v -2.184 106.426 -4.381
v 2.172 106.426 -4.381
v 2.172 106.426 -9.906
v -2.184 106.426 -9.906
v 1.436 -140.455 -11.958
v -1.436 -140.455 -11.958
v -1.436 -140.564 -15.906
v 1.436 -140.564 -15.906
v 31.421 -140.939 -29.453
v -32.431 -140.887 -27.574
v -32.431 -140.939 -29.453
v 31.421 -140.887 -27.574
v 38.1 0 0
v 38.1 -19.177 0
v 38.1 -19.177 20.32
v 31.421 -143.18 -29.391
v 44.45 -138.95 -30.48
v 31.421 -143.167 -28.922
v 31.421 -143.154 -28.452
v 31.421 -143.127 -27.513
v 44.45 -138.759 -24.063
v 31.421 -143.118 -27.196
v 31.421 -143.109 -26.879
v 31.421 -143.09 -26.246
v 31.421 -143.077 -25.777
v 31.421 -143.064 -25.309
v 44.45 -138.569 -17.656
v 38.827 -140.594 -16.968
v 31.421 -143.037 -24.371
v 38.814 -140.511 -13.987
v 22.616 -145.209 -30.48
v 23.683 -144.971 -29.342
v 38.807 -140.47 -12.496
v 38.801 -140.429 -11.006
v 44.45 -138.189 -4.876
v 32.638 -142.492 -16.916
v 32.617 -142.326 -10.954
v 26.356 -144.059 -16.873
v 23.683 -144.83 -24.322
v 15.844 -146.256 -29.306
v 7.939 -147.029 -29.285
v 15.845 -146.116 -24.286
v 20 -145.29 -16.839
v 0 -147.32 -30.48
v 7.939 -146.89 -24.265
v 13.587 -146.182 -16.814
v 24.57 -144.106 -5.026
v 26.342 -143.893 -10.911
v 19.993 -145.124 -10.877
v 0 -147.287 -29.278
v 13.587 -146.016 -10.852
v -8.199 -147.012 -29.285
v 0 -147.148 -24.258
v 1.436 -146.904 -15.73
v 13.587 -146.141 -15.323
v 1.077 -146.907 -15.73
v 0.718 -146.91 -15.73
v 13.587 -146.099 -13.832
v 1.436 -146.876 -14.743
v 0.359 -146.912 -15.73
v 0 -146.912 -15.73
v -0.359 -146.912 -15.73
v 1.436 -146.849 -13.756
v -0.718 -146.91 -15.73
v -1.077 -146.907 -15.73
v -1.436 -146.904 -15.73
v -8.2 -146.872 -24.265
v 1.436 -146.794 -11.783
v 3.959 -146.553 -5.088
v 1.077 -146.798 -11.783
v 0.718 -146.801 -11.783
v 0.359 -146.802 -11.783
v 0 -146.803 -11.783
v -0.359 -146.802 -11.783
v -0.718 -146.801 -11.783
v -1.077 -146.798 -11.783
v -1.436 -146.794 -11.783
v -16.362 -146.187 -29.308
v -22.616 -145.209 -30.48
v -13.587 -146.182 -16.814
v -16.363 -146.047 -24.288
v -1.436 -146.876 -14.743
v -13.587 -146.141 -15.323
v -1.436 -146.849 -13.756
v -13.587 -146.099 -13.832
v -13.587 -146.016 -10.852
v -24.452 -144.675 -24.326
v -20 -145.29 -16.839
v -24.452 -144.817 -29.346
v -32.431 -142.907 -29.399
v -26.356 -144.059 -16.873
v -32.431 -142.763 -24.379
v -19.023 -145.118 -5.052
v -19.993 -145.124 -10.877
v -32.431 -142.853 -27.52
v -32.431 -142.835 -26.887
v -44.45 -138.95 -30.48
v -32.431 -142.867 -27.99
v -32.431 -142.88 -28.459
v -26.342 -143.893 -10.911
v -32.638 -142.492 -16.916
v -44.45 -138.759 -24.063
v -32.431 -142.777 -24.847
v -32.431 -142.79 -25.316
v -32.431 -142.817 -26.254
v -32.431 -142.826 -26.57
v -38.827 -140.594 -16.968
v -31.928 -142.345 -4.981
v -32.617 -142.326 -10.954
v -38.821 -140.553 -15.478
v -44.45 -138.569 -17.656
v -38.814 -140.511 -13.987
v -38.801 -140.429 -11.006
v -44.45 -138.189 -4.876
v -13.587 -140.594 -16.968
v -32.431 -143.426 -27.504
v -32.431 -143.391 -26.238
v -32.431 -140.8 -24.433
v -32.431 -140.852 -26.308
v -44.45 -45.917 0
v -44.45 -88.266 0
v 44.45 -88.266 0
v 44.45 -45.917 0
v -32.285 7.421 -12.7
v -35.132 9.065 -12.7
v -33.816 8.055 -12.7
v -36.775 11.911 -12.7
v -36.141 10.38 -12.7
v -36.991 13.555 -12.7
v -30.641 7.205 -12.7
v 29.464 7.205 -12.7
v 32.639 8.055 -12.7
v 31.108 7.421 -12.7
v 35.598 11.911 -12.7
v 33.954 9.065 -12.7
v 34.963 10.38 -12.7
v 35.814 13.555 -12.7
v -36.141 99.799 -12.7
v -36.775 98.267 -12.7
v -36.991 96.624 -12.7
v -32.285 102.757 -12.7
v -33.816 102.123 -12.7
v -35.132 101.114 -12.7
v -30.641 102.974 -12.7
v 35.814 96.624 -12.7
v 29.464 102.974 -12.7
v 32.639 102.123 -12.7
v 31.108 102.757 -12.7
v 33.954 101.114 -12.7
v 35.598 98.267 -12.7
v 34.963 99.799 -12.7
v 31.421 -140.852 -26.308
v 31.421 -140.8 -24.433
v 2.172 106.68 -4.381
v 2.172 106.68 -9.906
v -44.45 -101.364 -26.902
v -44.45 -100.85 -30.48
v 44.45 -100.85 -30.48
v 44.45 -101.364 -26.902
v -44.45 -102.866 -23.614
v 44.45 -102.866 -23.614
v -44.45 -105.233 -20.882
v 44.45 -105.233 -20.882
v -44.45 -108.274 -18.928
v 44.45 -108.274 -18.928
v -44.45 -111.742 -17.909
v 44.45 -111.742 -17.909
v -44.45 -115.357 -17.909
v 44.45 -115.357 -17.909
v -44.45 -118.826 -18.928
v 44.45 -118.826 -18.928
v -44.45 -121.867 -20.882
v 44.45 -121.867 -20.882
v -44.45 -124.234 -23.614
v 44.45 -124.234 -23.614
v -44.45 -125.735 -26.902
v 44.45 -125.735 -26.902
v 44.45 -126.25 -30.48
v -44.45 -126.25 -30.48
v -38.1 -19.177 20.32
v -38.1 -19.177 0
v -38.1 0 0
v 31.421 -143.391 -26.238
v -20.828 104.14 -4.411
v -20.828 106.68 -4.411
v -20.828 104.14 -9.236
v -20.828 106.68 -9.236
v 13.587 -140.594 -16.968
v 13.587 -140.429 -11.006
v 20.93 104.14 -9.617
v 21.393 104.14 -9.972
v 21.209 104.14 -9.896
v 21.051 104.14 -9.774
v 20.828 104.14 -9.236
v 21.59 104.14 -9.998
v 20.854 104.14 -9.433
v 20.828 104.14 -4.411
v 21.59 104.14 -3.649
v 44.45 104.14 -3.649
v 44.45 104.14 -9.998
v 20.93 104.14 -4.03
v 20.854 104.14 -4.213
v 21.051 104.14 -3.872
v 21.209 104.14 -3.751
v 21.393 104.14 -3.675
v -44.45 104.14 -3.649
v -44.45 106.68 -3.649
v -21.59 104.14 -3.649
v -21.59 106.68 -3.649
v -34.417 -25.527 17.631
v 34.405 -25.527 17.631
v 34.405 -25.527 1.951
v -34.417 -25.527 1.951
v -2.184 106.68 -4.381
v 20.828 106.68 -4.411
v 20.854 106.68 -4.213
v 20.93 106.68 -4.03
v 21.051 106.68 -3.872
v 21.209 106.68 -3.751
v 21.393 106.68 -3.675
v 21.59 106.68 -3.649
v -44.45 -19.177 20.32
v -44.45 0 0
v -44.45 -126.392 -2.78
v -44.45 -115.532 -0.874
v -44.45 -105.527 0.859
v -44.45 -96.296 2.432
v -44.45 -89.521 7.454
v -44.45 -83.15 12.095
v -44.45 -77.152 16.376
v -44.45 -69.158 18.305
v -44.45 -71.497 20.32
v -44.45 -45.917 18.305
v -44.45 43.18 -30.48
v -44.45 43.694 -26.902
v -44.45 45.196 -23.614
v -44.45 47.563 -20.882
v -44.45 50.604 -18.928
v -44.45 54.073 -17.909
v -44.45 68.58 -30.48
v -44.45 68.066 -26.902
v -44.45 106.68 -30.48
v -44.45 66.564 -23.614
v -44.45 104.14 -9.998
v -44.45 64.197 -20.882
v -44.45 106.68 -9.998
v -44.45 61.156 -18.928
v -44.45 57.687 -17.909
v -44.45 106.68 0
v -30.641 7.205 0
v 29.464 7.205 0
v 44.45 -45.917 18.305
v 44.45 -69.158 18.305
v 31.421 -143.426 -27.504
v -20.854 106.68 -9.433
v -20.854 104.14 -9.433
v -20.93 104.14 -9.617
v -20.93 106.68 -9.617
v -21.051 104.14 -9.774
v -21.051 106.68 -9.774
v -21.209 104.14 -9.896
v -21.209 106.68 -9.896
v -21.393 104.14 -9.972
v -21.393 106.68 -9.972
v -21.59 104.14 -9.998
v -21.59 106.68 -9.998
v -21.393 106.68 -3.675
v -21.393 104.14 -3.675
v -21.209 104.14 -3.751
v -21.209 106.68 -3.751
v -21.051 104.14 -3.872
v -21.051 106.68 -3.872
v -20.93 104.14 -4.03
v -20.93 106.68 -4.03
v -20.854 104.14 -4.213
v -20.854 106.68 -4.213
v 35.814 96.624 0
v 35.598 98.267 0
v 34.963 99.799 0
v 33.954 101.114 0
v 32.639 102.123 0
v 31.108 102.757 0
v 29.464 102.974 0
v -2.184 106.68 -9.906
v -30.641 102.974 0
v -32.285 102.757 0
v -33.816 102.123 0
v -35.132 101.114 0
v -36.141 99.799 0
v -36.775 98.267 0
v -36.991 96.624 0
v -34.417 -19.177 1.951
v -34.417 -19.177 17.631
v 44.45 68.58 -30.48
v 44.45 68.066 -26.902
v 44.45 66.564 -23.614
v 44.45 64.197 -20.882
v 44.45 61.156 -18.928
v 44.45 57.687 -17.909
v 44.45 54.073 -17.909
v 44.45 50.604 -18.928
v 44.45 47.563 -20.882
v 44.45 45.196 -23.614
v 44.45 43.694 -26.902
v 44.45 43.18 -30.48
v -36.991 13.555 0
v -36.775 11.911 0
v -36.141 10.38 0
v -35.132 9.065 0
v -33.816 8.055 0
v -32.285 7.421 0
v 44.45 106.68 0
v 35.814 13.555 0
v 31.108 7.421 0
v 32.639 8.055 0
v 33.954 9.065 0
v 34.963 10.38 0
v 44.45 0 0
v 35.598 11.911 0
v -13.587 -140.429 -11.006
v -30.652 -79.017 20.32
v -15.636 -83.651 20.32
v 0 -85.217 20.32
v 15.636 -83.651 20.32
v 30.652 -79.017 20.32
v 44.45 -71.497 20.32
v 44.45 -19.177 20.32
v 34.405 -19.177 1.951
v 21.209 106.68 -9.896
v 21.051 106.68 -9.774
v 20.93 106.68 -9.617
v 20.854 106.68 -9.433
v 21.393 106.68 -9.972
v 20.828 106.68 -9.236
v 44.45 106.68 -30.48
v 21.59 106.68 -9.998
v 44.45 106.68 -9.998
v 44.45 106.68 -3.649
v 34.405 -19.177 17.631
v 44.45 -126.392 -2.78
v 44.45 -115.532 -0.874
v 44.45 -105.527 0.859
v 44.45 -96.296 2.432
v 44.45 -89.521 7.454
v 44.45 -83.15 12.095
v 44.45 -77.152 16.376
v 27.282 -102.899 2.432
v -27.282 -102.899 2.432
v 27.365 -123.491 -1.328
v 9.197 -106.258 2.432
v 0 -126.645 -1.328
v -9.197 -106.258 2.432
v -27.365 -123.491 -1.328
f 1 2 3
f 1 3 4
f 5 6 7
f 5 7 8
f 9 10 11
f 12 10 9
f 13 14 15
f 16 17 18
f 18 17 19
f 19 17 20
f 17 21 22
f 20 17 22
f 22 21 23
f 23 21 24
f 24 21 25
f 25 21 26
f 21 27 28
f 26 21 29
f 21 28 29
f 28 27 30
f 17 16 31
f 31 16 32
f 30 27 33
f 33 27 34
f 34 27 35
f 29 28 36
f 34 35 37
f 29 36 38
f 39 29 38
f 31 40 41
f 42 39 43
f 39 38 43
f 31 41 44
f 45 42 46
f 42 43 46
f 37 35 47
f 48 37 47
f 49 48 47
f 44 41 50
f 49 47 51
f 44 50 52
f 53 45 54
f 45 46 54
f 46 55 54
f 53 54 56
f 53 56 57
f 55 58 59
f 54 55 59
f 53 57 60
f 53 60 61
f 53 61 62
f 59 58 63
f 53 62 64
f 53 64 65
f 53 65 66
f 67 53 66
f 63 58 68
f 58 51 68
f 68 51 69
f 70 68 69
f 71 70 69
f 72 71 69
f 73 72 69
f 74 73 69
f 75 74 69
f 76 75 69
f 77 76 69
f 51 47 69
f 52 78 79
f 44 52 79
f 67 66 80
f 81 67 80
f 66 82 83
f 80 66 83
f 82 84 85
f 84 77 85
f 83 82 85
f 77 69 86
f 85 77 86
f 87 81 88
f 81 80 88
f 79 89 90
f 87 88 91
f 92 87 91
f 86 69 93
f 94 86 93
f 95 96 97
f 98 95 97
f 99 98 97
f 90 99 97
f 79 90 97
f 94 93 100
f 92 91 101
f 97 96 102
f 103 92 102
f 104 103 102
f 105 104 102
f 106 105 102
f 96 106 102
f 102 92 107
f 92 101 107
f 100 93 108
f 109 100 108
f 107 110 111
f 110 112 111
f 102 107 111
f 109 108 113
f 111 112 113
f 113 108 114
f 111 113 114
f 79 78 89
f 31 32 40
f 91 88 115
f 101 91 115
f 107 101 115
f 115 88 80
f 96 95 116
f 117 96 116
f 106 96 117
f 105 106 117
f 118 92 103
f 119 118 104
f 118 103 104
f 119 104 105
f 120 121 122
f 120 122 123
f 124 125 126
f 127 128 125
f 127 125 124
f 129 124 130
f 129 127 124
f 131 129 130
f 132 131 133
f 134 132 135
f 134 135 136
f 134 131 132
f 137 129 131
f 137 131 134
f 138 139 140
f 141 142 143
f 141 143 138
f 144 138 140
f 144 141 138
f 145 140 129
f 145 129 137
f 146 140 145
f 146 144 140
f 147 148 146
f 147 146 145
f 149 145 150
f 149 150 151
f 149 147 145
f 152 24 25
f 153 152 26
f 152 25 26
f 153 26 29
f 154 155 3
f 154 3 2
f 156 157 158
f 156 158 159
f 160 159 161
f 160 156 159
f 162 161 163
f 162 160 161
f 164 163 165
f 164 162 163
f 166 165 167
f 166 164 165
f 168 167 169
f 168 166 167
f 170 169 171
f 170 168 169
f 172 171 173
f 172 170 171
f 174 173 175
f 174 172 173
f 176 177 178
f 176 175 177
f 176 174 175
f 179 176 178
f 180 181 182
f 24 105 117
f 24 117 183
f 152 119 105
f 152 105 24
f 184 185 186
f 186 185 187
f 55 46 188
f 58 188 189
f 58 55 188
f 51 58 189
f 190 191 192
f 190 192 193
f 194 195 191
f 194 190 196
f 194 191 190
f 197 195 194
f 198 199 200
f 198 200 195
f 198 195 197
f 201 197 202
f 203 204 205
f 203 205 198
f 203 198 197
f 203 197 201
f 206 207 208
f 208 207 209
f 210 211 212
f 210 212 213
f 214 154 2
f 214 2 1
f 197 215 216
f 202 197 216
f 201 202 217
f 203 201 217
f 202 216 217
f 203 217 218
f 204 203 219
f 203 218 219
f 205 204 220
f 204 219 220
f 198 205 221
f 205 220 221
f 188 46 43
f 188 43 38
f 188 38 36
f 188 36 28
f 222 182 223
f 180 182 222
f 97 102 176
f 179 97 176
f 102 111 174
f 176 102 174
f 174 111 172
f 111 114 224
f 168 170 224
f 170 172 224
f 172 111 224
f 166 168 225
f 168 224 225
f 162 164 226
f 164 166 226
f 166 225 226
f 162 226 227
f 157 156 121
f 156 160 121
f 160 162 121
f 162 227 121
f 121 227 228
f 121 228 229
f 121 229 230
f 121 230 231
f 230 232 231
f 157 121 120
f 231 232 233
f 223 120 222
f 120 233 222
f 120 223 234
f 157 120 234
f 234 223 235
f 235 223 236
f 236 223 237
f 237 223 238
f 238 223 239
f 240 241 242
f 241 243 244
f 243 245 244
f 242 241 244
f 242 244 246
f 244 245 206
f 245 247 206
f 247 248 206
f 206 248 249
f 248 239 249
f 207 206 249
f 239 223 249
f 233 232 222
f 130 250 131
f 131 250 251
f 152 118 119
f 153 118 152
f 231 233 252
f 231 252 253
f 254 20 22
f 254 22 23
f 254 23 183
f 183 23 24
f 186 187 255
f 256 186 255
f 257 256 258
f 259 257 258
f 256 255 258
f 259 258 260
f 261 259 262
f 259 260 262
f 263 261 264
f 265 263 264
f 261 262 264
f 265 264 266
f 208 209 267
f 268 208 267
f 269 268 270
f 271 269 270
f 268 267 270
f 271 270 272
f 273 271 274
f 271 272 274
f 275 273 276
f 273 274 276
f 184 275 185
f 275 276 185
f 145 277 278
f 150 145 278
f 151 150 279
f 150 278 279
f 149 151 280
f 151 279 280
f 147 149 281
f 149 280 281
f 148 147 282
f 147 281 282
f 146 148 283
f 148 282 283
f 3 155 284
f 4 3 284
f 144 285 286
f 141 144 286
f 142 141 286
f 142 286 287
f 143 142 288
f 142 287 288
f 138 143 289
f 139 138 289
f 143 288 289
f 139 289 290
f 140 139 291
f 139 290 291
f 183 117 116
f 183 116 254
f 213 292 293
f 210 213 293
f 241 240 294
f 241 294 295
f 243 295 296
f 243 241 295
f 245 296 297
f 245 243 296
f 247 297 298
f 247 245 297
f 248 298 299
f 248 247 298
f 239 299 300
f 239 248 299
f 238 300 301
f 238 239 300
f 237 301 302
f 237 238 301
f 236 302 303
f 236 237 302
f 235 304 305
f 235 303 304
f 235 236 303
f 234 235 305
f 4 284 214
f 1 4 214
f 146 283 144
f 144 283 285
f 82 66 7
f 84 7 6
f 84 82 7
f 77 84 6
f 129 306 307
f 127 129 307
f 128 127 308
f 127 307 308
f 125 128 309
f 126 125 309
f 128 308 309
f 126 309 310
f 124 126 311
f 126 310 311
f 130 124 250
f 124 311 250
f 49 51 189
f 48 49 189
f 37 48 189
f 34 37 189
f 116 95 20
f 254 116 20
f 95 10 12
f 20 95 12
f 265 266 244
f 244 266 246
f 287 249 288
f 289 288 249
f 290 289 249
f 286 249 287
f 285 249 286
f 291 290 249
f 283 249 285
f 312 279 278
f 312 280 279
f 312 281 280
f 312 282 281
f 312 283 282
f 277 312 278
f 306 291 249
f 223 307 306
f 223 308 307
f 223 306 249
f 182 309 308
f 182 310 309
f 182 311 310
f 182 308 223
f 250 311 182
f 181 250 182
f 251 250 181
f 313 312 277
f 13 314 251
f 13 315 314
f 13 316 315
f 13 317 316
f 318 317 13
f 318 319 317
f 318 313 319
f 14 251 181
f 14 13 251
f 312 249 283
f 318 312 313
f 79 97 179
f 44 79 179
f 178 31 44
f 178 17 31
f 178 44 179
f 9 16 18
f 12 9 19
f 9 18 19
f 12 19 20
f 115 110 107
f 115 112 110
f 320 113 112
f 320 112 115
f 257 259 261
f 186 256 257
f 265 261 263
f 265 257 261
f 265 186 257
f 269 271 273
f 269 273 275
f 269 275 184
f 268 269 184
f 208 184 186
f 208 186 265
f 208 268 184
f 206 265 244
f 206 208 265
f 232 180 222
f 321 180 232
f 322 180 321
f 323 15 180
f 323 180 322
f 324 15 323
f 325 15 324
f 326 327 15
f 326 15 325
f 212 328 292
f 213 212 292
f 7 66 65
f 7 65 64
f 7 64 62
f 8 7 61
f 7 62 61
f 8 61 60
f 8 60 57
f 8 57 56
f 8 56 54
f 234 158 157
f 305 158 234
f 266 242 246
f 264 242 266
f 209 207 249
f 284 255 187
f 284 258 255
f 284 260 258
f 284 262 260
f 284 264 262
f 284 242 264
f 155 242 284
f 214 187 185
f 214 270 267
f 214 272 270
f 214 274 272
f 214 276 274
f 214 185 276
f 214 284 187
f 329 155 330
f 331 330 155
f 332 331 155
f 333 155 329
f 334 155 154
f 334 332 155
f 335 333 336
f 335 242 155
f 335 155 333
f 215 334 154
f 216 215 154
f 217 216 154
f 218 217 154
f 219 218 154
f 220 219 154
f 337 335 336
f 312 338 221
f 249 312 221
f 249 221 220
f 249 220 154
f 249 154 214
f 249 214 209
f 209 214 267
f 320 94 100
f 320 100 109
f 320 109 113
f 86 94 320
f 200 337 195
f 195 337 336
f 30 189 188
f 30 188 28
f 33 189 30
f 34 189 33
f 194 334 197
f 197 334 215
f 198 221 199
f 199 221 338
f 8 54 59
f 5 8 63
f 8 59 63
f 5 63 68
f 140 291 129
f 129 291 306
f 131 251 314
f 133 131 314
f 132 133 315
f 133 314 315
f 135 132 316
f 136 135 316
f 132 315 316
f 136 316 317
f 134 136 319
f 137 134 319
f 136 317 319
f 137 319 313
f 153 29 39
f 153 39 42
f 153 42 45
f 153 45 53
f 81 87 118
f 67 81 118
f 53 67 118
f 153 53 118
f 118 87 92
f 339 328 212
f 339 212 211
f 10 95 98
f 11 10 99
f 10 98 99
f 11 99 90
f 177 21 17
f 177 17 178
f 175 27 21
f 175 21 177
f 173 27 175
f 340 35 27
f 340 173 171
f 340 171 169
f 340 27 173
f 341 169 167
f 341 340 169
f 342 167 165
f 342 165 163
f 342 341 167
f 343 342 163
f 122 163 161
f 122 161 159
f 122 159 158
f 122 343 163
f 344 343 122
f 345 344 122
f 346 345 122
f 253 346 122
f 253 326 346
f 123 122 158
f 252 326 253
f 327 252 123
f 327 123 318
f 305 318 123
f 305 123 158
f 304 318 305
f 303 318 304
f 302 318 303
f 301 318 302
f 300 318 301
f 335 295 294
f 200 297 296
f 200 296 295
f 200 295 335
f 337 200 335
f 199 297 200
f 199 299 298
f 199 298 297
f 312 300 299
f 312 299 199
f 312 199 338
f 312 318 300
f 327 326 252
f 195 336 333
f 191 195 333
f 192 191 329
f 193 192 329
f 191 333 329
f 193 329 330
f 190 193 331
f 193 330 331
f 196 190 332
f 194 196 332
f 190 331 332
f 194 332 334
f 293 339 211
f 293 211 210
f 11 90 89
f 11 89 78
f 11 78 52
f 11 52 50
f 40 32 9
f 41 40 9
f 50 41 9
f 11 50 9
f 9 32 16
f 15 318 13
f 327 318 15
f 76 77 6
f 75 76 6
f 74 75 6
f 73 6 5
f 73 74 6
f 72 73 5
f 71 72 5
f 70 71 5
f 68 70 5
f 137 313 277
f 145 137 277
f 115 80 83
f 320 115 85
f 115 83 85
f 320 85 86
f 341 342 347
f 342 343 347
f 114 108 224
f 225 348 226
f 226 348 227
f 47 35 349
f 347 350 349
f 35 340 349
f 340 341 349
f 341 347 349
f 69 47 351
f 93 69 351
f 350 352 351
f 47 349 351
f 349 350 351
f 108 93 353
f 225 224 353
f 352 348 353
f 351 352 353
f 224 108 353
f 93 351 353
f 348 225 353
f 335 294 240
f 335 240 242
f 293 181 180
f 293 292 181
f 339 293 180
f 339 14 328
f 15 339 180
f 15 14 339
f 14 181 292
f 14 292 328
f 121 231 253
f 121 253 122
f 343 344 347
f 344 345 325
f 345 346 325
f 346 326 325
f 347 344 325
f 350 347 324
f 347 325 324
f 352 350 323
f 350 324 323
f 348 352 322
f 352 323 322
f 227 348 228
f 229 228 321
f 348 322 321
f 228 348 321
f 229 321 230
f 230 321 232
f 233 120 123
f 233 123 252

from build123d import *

# Parameters (mm, degrees)
F1_DEPTH       = 44.45
F3_ANGLE_BACK  = 90
F3_ANGLE       = 180
F5_DEPTH       = 12.7
F7_W           = 19.1765794656
F7_H           = 20.32
F8_DEPTH       = 38.1
F9_W           = 68.8219781561
F9_H           = 15.6805519946
F10_DEPTH      = 6.35
F12_DEPTH      = 2.54
F14_DEPTH      = 44.451
F14_DEPTH_BACK = 44.451
F15_W          = 4.3561459895
F15_H          = 5.5247349744
F16_DEPTH      = 0.254
F17_W          = 30.8628306508
F17_H          = 5.9643723071
F17_W_2        = 2.8725753073
F17_H_2        = 3.9488319308
F18_DEPTH      = 6.35
F19_ANGLE_BACK = 70
F19_ANGLE      = 140
F21_DEPTH      = 44.4510001
F21_DEPTH_BACK = 44.4510001
F22_W          = 63.8522766531
F22_H          = 1.2669962529
F23_DEPTH      = 2.54


with BuildPart() as f1:
    # F0 (on Right) → F1 (new body, symmetric)
    with BuildSketch(Plane.YZ):
        Polygon((-146.6177896183, -5.0897085369), (-147.32, -30.48), (106.68, -30.48), (106.68, 0), (0, 0), (-19.1765794656, 20.32), (-85.2165794656, 20.32), (-106.68, 2.4324294841), align=None)
    extrude(amount=F1_DEPTH, both=True)

    # F2 (on Right) → F3 (revolve, cut)
    with BuildSketch(Plane.YZ, mode=Mode.PRIVATE) as f3_sk:
        Polygon((-106.68, 2.4324294841), (-62.3583516914, 39.37), (-179.07, 39.37), (-179.07, -11.2019648213), align=None)
    revolve(f3_sk.sketch.rotate(Axis((0, -6.35, 51.4768799767), (0, 0, -1)), -F3_ANGLE_BACK), axis=Axis((0, -6.35, 51.4768799767), (0, 0, -1)), revolution_arc=F3_ANGLE, mode=Mode.SUBTRACT)

    # F4 (on face) → F5 (cut)
    with BuildSketch(Plane.XY):
        with BuildLine():
            Line((-30.6413764298, 7.2046327405), (29.4640543103, 7.2046327405))
            ThreePointArc((29.4640543103, 7.2046327405), (33.9541823709, 9.0645046799), (35.8140543103, 13.5546327405))
            Line((35.8140543103, 13.5546327405), (35.8140543103, 96.6237889767))
            ThreePointArc((35.8140543103, 96.6237889767), (33.9541823709, 101.1139170372), (29.4640543103, 102.9737889767))
            Line((29.4640543103, 102.9737889767), (-30.6413764298, 102.9737889767))
            ThreePointArc((-30.6413764298, 102.9737889767), (-35.1315044903, 101.1139170372), (-36.9913764298, 96.6237889767))
            Line((-36.9913764298, 96.6237889767), (-36.9913764298, 13.5546327405))
            ThreePointArc((-36.9913764298, 13.5546327405), (-35.1315044903, 9.0645046799), (-30.6413764298, 7.2046327405))
        make_face()
    extrude(amount=-F5_DEPTH, mode=Mode.SUBTRACT)

    # F7 (on Right) → F8 (cut, symmetric)
    with BuildSketch(Plane.YZ):
        with Locations((-9.5882897328, 10.16)):
            Rectangle(F7_W, F7_H)
    extrude(amount=F8_DEPTH, both=True, mode=Mode.SUBTRACT)

    # F9 (on face) → F10 (cut)
    with BuildSketch(Plane(origin=(0, -19.1765794656, 0), x_dir=(-1, 0, 0), z_dir=(0, 1, 0))):
        with Locations((0.006010922, 9.7910461482)):
            Rectangle(F9_W, F9_H)
    extrude(amount=-F10_DEPTH, mode=Mode.SUBTRACT)

    # F11 (on face) → F12 (cut)
    with BuildSketch(Plane(origin=(0, 106.68, 0), x_dir=(-1, 0, 0), z_dir=(0, 1, 0))):
        with BuildLine():
            Line((-21.59, -3.6485542078), (-44.45, -3.6485542078))
            Line((-44.45, -3.6485542078), (-44.45, -9.9976139794))
            Line((-44.45, -9.9976139794), (-21.59, -9.9976139794))
            ThreePointArc((-21.59, -9.9976139794), (-21.0511846327, -9.7744293467), (-20.828, -9.2356139794))
            Line((-20.828, -9.2356139794), (-20.828, -4.4105542078))
            ThreePointArc((-20.828, -4.4105542078), (-21.0511846327, -3.8717388405), (-21.59, -3.6485542078))
        make_face()
        with BuildLine():
            Line((44.45, -9.9976139794), (44.45, -3.6485542078))
            Line((44.45, -3.6485542078), (21.59, -3.6485542078))
            ThreePointArc((21.59, -3.6485542078), (21.0511846327, -3.8717388405), (20.828, -4.4105542078))
            Line((20.828, -4.4105542078), (20.828, -9.2356139794))
            ThreePointArc((20.828, -9.2356139794), (21.0511846327, -9.7744293467), (21.59, -9.9976139794))
            Line((21.59, -9.9976139794), (44.45, -9.9976139794))
        make_face()
    extrude(amount=-F12_DEPTH, mode=Mode.SUBTRACT)

    # F13 (on Right) → F14 (cut, two sides)
    with BuildSketch(Plane.YZ) as f14_sk:
        Polygon((-88.2660076022, 0), (-45.9169372916, 0), (-45.9169372916, 18.3047242463), (-69.1584387047, 18.3047242463), align=None)
    extrude(amount=-F14_DEPTH, mode=Mode.SUBTRACT)
    extrude(f14_sk.sketch, amount=F14_DEPTH_BACK, mode=Mode.SUBTRACT)

    # F15 (on face) → F16 (cut)
    with BuildSketch(Plane(origin=(0, 106.68, 0), x_dir=(-1, 0, 0), z_dir=(0, 1, 0))):
        with Locations((0.0063270053, -7.1436325128)):
            Rectangle(F15_W, F15_H)
    extrude(amount=-F16_DEPTH, mode=Mode.SUBTRACT)

    # F17 (on face) → F18 (cut)
    with BuildSketch(Plane(origin=(0, -146.3650721201, 4.0479674412), x_dir=(1, 0, 0), z_dir=(0, -0.9996177741, 0.027646078))):
        with Locations((-29.0185846746, -17.8666524589)):
            Rectangle(F17_W, F17_H)
        with Locations((29.0185846746, -17.8666524589)):
            Rectangle(F17_W, F17_H)
        with Locations((0, -17.8110701963)):
            Rectangle(F17_W_2, F17_H_2)
        Polygon((-32.4309132993, -33.338483423), (31.4213633537, -33.338483423), (31.4213633537, -31.7079313099), (31.4213633537, -30.8274384588), (31.4213633537, -28.3163934946), (-32.4309132993, -28.3163934946), (-32.4309132993, -30.8274384588), (-32.4309132993, -31.7079313099), align=None)
    extrude(amount=-F18_DEPTH, mode=Mode.SUBTRACT)

    # F6 (on Right) → F19 (revolve, cut)
    with BuildSketch(Plane.YZ, mode=Mode.PRIVATE) as f19_sk:
        Polygon((-181.2299340963, -30.48), (-147.32, -30.48), (-146.1423057277, 12.1026812121), (-181.2299340963, 12.1026812121), align=None)
    revolve(f19_sk.sketch.rotate(Axis((0, -25.1088291407, 39.4888808951), (0, 0, -1)), -F19_ANGLE_BACK), axis=Axis((0, -25.1088291407, 39.4888808951), (0, 0, -1)), revolution_arc=F19_ANGLE, mode=Mode.SUBTRACT)

    # F20 (on Right) → F21 (cut, two sides)
    with BuildSketch(Plane.YZ) as f21_sk:
        with BuildLine():
            Line((-126.2498049921, -30.48), (-100.8498049921, -30.48))
            ThreePointArc((-100.8498049921, -30.48), (-113.5498049921, -17.78), (-126.2498049921, -30.48))
        make_face()
        with BuildLine():
            Line((43.18, -30.48), (68.58, -30.48))
            ThreePointArc((68.58, -30.48), (55.88, -17.78), (43.18, -30.48))
        make_face()
    extrude(amount=F21_DEPTH, mode=Mode.SUBTRACT)
    extrude(f21_sk.sketch, amount=-F21_DEPTH_BACK, mode=Mode.SUBTRACT)

    # F22 (on face) → F23 (join)
    with BuildSketch(Plane(origin=(0, -140.0174992543, 3.8724148458), x_dir=(1, 0, 0), z_dir=(0, -0.9996177741, 0.027646078))):
        with Locations((-0.5047749728, -30.8253852965)):
            Rectangle(F22_W, F22_H)
    extrude(amount=F23_DEPTH)


solid = f1.part
